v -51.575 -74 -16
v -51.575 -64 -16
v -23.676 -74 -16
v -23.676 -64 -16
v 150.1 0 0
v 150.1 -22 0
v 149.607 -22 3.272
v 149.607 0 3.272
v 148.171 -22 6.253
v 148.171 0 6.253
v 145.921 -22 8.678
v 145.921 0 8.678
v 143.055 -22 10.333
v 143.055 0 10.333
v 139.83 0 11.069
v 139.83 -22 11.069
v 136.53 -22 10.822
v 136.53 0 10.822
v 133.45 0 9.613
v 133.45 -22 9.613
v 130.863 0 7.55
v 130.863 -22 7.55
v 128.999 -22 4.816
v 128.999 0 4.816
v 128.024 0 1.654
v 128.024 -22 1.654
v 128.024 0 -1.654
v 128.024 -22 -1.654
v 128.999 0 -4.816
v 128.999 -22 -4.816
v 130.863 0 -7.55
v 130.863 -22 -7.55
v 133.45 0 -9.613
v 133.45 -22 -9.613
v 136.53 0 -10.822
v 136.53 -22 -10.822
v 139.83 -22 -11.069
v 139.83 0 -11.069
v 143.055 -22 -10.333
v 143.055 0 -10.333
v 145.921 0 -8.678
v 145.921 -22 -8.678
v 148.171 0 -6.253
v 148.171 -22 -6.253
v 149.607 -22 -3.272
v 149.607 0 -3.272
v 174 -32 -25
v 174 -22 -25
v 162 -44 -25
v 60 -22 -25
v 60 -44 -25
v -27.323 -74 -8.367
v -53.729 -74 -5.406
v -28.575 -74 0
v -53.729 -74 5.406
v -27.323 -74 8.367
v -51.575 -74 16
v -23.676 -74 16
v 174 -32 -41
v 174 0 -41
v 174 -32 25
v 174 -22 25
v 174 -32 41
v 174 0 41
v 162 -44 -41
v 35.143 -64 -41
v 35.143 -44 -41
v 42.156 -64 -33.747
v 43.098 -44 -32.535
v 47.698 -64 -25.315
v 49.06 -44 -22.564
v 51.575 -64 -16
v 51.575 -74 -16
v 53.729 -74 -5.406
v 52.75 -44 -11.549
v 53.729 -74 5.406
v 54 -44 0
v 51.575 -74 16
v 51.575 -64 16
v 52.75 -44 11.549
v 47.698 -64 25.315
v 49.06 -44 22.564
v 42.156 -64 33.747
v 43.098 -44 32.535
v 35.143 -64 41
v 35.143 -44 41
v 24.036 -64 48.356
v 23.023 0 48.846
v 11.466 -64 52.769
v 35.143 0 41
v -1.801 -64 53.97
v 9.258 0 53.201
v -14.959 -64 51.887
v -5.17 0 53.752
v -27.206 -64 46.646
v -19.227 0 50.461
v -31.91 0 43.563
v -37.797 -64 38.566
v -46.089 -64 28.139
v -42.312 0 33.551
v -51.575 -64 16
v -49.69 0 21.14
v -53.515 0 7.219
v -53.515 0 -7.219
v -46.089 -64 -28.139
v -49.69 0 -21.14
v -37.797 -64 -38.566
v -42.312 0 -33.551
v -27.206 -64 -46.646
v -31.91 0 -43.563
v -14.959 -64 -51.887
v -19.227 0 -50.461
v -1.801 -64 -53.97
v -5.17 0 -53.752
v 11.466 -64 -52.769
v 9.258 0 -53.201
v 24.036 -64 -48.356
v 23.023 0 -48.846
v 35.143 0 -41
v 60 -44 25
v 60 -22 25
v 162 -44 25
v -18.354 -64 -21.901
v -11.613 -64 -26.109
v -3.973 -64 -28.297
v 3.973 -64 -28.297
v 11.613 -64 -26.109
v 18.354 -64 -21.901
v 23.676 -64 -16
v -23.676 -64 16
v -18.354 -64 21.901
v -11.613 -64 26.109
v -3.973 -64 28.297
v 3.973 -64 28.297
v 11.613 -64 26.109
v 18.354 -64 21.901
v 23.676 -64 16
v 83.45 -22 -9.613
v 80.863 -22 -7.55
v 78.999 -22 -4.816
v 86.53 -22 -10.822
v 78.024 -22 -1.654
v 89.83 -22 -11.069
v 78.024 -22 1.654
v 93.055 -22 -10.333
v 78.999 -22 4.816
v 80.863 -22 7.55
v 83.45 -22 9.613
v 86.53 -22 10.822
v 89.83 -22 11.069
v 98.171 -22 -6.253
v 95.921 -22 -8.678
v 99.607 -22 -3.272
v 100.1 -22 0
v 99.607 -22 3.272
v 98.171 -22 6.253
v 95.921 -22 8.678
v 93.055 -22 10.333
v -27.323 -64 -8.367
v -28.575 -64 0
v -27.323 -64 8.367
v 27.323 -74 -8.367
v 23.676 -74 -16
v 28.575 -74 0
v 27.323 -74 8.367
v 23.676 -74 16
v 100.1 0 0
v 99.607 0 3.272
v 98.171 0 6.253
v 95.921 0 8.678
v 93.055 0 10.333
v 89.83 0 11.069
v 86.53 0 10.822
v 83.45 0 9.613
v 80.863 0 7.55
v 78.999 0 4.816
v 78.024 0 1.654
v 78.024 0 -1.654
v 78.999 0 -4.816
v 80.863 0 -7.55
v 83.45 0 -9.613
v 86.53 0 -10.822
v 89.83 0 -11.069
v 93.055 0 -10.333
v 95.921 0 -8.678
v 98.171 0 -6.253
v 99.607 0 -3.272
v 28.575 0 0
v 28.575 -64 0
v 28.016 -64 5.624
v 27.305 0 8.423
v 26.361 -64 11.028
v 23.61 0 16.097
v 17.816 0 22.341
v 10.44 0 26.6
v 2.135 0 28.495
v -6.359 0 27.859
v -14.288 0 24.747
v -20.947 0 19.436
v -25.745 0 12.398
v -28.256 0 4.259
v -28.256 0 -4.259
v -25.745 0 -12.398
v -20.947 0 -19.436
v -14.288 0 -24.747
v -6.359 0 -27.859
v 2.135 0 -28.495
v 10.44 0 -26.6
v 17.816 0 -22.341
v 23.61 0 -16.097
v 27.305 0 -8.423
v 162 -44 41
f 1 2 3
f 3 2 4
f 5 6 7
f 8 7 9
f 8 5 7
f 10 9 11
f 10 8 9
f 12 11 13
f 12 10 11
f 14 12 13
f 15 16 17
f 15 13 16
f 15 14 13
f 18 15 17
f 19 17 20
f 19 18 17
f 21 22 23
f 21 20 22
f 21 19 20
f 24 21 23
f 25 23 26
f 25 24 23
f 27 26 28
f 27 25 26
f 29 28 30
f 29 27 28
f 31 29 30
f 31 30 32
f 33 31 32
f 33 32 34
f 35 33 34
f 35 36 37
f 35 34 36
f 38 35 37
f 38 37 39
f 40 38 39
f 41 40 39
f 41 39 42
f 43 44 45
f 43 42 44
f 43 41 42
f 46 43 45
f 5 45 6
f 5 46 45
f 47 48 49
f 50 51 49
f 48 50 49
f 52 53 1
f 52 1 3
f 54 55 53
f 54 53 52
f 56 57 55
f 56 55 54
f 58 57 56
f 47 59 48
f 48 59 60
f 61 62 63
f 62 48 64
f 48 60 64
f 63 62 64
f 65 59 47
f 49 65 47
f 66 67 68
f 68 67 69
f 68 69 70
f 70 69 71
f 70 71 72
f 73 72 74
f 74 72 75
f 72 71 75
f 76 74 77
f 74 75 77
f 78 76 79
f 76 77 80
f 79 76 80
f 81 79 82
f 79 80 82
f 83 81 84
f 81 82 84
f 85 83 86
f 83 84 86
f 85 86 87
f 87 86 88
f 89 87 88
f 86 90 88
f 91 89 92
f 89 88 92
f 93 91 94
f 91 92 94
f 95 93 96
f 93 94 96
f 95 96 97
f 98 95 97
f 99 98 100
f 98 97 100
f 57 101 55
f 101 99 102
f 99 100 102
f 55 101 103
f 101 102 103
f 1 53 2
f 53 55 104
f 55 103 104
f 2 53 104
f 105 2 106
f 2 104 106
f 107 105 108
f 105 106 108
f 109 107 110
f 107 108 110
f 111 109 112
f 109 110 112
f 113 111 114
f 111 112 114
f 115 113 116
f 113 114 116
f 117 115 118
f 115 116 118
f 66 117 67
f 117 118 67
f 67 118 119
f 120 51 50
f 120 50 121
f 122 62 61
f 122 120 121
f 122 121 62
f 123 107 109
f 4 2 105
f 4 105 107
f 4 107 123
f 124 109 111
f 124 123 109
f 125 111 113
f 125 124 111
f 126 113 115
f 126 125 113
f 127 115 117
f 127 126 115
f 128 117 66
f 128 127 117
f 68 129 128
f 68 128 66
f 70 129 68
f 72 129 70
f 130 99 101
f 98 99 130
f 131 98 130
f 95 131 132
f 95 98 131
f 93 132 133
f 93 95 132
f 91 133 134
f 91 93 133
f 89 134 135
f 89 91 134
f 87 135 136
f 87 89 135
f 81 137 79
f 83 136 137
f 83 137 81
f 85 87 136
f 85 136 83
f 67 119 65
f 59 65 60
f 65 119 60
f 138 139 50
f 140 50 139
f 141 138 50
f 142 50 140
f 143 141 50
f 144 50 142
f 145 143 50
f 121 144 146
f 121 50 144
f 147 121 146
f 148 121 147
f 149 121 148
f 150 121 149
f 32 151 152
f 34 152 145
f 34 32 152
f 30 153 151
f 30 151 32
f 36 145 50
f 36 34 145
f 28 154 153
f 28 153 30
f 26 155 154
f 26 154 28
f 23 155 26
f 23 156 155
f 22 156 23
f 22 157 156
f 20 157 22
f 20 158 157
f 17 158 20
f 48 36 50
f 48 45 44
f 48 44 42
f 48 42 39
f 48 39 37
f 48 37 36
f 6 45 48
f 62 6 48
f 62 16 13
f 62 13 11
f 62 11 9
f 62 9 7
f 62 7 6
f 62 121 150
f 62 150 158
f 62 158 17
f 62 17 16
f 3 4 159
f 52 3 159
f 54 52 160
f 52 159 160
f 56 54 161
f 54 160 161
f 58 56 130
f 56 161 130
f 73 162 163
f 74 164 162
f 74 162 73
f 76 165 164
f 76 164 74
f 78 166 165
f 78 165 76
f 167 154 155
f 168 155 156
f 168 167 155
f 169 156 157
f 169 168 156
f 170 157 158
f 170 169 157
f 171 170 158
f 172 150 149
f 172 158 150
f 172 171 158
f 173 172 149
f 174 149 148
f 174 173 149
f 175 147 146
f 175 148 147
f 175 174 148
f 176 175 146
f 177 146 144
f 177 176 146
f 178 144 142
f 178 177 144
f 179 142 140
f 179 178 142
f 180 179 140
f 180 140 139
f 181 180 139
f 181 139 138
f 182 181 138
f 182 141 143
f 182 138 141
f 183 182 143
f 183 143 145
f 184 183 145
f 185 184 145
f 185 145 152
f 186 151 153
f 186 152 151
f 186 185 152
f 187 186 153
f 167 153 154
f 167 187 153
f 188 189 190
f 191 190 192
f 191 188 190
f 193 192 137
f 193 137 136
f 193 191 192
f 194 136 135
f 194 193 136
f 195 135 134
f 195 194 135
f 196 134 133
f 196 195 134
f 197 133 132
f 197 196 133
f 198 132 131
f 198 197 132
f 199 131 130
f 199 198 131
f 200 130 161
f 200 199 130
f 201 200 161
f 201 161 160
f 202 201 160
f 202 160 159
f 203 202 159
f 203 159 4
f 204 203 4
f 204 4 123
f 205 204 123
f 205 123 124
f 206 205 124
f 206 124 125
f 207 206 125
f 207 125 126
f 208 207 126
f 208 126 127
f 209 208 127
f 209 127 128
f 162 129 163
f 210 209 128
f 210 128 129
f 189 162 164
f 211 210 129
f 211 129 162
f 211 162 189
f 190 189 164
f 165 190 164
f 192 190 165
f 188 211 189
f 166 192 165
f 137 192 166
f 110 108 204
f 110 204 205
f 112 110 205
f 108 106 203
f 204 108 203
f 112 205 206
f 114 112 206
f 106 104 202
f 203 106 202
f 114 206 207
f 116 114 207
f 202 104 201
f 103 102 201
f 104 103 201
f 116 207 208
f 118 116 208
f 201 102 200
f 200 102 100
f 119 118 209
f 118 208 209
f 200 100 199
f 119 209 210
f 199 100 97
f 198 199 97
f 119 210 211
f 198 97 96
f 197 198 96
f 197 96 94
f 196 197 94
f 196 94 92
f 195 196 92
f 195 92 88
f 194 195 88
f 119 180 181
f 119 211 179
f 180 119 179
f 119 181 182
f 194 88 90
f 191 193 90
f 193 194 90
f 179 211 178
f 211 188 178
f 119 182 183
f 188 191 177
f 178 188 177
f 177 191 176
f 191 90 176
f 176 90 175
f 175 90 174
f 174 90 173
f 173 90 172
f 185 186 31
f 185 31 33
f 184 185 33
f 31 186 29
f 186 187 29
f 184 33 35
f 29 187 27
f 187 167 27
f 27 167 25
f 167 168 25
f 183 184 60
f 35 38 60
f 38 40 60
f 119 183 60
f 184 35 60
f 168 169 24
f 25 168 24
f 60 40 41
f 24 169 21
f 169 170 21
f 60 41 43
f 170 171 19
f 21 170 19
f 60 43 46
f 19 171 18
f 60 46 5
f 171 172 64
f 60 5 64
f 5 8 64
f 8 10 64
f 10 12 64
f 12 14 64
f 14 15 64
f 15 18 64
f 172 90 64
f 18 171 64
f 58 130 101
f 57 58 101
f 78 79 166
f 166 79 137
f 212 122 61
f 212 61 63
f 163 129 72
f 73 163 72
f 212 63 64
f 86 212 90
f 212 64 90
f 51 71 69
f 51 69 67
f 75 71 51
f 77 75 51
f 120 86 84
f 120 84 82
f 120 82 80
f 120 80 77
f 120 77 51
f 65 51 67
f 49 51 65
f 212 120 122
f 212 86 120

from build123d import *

# Parameters (mm, degrees)
F0_R     = 28.575
F1_DEPTH = 64
F0_R_2   = 11.1
F2_DEPTH = 44
F3_W     = 114
F3_H     = 50
F4_DEPTH = 22
F5_SIZE  = 12
F7_DEPTH = 10
F8_SIZE  = 12


# Not quite as in the source:
# - after a boolean that leaves OpenCascade's solid faulty, fix() repairs it


with BuildPart() as f1:
    # F0 (on Front) → F1 (new body)
    with BuildSketch(Plane.XZ):
        with BuildLine():
            ThreePointArc((35.1425667816, -41), (49.0596504584, -22.5643678594), (54, 0))
            ThreePointArc((54, 0), (49.0596504584, 22.5643678594), (35.1425667816, 41))
            ThreePointArc((35.1425667816, 41), (-54, 0), (35.1425667816, -41))
        make_face()
        Circle(F0_R, mode=Mode.SUBTRACT)
    extrude(amount=F1_DEPTH)

    # F0 (on Front) → F2 (join)
    with BuildSketch(Plane.XZ):
        with BuildLine():
            ThreePointArc((35.1425667816, 41), (49.0596504584, 22.5643678594), (54, 0))
            ThreePointArc((54, 0), (49.0596504584, -22.5643678594), (35.1425667816, -41))
            Line((35.1425667816, -41), (174, -41))
            Line((174, -41), (174, 41))
            Line((174, 41), (35.1425667816, 41))
        make_face()
        with Locations((89, 0)):
            Circle(F0_R_2, mode=Mode.SUBTRACT)
        with Locations((139, 0)):
            Circle(F0_R_2, mode=Mode.SUBTRACT)
    extrude(amount=F2_DEPTH)

    # F3 (on face) → F4 (cut)
    with BuildSketch(Plane.XZ.offset(44)):
        with Locations((117, 0)):
            Rectangle(F3_W, F3_H)
    extrude(amount=-F4_DEPTH, mode=Mode.SUBTRACT)

    # F5
    f5_edges = [f1.edges().sort_by_distance(p)[0] for p in [
        (174, -44, -33),
    ]]
    chamfer(f5_edges, length=F5_SIZE)

    # F6 (on face) → F7 (join)
    with BuildSketch(Plane.XZ.offset(64)):
        with BuildLine():
            Line((-23.6755279772, 16), (-51.5751878329, 16))
            ThreePointArc((-51.5751878329, 16), (-54, 0), (-51.5751878329, -16))
            Line((-51.5751878329, -16), (-23.6755279772, -16))
            ThreePointArc((-23.6755279772, -16), (-28.575, 0), (-23.6755279772, 16))
        make_face()
        with BuildLine():
            Line((51.5751878329, 16), (23.6755279772, 16))
            ThreePointArc((23.6755279772, 16), (28.575, 0), (23.6755279772, -16))
            Line((23.6755279772, -16), (51.5751878329, -16))
            ThreePointArc((51.5751878329, -16), (54, 0), (51.5751878329, 16))
        make_face()
    extrude(amount=F7_DEPTH)

    add(f1.part.fix(), mode=Mode.REPLACE)

    # F8
    f8_edges = [f1.edges().sort_by_distance(p)[0] for p in [
        (174, -44, 33),
    ]]
    chamfer(f8_edges, length=F8_SIZE)


solid = f1.part
